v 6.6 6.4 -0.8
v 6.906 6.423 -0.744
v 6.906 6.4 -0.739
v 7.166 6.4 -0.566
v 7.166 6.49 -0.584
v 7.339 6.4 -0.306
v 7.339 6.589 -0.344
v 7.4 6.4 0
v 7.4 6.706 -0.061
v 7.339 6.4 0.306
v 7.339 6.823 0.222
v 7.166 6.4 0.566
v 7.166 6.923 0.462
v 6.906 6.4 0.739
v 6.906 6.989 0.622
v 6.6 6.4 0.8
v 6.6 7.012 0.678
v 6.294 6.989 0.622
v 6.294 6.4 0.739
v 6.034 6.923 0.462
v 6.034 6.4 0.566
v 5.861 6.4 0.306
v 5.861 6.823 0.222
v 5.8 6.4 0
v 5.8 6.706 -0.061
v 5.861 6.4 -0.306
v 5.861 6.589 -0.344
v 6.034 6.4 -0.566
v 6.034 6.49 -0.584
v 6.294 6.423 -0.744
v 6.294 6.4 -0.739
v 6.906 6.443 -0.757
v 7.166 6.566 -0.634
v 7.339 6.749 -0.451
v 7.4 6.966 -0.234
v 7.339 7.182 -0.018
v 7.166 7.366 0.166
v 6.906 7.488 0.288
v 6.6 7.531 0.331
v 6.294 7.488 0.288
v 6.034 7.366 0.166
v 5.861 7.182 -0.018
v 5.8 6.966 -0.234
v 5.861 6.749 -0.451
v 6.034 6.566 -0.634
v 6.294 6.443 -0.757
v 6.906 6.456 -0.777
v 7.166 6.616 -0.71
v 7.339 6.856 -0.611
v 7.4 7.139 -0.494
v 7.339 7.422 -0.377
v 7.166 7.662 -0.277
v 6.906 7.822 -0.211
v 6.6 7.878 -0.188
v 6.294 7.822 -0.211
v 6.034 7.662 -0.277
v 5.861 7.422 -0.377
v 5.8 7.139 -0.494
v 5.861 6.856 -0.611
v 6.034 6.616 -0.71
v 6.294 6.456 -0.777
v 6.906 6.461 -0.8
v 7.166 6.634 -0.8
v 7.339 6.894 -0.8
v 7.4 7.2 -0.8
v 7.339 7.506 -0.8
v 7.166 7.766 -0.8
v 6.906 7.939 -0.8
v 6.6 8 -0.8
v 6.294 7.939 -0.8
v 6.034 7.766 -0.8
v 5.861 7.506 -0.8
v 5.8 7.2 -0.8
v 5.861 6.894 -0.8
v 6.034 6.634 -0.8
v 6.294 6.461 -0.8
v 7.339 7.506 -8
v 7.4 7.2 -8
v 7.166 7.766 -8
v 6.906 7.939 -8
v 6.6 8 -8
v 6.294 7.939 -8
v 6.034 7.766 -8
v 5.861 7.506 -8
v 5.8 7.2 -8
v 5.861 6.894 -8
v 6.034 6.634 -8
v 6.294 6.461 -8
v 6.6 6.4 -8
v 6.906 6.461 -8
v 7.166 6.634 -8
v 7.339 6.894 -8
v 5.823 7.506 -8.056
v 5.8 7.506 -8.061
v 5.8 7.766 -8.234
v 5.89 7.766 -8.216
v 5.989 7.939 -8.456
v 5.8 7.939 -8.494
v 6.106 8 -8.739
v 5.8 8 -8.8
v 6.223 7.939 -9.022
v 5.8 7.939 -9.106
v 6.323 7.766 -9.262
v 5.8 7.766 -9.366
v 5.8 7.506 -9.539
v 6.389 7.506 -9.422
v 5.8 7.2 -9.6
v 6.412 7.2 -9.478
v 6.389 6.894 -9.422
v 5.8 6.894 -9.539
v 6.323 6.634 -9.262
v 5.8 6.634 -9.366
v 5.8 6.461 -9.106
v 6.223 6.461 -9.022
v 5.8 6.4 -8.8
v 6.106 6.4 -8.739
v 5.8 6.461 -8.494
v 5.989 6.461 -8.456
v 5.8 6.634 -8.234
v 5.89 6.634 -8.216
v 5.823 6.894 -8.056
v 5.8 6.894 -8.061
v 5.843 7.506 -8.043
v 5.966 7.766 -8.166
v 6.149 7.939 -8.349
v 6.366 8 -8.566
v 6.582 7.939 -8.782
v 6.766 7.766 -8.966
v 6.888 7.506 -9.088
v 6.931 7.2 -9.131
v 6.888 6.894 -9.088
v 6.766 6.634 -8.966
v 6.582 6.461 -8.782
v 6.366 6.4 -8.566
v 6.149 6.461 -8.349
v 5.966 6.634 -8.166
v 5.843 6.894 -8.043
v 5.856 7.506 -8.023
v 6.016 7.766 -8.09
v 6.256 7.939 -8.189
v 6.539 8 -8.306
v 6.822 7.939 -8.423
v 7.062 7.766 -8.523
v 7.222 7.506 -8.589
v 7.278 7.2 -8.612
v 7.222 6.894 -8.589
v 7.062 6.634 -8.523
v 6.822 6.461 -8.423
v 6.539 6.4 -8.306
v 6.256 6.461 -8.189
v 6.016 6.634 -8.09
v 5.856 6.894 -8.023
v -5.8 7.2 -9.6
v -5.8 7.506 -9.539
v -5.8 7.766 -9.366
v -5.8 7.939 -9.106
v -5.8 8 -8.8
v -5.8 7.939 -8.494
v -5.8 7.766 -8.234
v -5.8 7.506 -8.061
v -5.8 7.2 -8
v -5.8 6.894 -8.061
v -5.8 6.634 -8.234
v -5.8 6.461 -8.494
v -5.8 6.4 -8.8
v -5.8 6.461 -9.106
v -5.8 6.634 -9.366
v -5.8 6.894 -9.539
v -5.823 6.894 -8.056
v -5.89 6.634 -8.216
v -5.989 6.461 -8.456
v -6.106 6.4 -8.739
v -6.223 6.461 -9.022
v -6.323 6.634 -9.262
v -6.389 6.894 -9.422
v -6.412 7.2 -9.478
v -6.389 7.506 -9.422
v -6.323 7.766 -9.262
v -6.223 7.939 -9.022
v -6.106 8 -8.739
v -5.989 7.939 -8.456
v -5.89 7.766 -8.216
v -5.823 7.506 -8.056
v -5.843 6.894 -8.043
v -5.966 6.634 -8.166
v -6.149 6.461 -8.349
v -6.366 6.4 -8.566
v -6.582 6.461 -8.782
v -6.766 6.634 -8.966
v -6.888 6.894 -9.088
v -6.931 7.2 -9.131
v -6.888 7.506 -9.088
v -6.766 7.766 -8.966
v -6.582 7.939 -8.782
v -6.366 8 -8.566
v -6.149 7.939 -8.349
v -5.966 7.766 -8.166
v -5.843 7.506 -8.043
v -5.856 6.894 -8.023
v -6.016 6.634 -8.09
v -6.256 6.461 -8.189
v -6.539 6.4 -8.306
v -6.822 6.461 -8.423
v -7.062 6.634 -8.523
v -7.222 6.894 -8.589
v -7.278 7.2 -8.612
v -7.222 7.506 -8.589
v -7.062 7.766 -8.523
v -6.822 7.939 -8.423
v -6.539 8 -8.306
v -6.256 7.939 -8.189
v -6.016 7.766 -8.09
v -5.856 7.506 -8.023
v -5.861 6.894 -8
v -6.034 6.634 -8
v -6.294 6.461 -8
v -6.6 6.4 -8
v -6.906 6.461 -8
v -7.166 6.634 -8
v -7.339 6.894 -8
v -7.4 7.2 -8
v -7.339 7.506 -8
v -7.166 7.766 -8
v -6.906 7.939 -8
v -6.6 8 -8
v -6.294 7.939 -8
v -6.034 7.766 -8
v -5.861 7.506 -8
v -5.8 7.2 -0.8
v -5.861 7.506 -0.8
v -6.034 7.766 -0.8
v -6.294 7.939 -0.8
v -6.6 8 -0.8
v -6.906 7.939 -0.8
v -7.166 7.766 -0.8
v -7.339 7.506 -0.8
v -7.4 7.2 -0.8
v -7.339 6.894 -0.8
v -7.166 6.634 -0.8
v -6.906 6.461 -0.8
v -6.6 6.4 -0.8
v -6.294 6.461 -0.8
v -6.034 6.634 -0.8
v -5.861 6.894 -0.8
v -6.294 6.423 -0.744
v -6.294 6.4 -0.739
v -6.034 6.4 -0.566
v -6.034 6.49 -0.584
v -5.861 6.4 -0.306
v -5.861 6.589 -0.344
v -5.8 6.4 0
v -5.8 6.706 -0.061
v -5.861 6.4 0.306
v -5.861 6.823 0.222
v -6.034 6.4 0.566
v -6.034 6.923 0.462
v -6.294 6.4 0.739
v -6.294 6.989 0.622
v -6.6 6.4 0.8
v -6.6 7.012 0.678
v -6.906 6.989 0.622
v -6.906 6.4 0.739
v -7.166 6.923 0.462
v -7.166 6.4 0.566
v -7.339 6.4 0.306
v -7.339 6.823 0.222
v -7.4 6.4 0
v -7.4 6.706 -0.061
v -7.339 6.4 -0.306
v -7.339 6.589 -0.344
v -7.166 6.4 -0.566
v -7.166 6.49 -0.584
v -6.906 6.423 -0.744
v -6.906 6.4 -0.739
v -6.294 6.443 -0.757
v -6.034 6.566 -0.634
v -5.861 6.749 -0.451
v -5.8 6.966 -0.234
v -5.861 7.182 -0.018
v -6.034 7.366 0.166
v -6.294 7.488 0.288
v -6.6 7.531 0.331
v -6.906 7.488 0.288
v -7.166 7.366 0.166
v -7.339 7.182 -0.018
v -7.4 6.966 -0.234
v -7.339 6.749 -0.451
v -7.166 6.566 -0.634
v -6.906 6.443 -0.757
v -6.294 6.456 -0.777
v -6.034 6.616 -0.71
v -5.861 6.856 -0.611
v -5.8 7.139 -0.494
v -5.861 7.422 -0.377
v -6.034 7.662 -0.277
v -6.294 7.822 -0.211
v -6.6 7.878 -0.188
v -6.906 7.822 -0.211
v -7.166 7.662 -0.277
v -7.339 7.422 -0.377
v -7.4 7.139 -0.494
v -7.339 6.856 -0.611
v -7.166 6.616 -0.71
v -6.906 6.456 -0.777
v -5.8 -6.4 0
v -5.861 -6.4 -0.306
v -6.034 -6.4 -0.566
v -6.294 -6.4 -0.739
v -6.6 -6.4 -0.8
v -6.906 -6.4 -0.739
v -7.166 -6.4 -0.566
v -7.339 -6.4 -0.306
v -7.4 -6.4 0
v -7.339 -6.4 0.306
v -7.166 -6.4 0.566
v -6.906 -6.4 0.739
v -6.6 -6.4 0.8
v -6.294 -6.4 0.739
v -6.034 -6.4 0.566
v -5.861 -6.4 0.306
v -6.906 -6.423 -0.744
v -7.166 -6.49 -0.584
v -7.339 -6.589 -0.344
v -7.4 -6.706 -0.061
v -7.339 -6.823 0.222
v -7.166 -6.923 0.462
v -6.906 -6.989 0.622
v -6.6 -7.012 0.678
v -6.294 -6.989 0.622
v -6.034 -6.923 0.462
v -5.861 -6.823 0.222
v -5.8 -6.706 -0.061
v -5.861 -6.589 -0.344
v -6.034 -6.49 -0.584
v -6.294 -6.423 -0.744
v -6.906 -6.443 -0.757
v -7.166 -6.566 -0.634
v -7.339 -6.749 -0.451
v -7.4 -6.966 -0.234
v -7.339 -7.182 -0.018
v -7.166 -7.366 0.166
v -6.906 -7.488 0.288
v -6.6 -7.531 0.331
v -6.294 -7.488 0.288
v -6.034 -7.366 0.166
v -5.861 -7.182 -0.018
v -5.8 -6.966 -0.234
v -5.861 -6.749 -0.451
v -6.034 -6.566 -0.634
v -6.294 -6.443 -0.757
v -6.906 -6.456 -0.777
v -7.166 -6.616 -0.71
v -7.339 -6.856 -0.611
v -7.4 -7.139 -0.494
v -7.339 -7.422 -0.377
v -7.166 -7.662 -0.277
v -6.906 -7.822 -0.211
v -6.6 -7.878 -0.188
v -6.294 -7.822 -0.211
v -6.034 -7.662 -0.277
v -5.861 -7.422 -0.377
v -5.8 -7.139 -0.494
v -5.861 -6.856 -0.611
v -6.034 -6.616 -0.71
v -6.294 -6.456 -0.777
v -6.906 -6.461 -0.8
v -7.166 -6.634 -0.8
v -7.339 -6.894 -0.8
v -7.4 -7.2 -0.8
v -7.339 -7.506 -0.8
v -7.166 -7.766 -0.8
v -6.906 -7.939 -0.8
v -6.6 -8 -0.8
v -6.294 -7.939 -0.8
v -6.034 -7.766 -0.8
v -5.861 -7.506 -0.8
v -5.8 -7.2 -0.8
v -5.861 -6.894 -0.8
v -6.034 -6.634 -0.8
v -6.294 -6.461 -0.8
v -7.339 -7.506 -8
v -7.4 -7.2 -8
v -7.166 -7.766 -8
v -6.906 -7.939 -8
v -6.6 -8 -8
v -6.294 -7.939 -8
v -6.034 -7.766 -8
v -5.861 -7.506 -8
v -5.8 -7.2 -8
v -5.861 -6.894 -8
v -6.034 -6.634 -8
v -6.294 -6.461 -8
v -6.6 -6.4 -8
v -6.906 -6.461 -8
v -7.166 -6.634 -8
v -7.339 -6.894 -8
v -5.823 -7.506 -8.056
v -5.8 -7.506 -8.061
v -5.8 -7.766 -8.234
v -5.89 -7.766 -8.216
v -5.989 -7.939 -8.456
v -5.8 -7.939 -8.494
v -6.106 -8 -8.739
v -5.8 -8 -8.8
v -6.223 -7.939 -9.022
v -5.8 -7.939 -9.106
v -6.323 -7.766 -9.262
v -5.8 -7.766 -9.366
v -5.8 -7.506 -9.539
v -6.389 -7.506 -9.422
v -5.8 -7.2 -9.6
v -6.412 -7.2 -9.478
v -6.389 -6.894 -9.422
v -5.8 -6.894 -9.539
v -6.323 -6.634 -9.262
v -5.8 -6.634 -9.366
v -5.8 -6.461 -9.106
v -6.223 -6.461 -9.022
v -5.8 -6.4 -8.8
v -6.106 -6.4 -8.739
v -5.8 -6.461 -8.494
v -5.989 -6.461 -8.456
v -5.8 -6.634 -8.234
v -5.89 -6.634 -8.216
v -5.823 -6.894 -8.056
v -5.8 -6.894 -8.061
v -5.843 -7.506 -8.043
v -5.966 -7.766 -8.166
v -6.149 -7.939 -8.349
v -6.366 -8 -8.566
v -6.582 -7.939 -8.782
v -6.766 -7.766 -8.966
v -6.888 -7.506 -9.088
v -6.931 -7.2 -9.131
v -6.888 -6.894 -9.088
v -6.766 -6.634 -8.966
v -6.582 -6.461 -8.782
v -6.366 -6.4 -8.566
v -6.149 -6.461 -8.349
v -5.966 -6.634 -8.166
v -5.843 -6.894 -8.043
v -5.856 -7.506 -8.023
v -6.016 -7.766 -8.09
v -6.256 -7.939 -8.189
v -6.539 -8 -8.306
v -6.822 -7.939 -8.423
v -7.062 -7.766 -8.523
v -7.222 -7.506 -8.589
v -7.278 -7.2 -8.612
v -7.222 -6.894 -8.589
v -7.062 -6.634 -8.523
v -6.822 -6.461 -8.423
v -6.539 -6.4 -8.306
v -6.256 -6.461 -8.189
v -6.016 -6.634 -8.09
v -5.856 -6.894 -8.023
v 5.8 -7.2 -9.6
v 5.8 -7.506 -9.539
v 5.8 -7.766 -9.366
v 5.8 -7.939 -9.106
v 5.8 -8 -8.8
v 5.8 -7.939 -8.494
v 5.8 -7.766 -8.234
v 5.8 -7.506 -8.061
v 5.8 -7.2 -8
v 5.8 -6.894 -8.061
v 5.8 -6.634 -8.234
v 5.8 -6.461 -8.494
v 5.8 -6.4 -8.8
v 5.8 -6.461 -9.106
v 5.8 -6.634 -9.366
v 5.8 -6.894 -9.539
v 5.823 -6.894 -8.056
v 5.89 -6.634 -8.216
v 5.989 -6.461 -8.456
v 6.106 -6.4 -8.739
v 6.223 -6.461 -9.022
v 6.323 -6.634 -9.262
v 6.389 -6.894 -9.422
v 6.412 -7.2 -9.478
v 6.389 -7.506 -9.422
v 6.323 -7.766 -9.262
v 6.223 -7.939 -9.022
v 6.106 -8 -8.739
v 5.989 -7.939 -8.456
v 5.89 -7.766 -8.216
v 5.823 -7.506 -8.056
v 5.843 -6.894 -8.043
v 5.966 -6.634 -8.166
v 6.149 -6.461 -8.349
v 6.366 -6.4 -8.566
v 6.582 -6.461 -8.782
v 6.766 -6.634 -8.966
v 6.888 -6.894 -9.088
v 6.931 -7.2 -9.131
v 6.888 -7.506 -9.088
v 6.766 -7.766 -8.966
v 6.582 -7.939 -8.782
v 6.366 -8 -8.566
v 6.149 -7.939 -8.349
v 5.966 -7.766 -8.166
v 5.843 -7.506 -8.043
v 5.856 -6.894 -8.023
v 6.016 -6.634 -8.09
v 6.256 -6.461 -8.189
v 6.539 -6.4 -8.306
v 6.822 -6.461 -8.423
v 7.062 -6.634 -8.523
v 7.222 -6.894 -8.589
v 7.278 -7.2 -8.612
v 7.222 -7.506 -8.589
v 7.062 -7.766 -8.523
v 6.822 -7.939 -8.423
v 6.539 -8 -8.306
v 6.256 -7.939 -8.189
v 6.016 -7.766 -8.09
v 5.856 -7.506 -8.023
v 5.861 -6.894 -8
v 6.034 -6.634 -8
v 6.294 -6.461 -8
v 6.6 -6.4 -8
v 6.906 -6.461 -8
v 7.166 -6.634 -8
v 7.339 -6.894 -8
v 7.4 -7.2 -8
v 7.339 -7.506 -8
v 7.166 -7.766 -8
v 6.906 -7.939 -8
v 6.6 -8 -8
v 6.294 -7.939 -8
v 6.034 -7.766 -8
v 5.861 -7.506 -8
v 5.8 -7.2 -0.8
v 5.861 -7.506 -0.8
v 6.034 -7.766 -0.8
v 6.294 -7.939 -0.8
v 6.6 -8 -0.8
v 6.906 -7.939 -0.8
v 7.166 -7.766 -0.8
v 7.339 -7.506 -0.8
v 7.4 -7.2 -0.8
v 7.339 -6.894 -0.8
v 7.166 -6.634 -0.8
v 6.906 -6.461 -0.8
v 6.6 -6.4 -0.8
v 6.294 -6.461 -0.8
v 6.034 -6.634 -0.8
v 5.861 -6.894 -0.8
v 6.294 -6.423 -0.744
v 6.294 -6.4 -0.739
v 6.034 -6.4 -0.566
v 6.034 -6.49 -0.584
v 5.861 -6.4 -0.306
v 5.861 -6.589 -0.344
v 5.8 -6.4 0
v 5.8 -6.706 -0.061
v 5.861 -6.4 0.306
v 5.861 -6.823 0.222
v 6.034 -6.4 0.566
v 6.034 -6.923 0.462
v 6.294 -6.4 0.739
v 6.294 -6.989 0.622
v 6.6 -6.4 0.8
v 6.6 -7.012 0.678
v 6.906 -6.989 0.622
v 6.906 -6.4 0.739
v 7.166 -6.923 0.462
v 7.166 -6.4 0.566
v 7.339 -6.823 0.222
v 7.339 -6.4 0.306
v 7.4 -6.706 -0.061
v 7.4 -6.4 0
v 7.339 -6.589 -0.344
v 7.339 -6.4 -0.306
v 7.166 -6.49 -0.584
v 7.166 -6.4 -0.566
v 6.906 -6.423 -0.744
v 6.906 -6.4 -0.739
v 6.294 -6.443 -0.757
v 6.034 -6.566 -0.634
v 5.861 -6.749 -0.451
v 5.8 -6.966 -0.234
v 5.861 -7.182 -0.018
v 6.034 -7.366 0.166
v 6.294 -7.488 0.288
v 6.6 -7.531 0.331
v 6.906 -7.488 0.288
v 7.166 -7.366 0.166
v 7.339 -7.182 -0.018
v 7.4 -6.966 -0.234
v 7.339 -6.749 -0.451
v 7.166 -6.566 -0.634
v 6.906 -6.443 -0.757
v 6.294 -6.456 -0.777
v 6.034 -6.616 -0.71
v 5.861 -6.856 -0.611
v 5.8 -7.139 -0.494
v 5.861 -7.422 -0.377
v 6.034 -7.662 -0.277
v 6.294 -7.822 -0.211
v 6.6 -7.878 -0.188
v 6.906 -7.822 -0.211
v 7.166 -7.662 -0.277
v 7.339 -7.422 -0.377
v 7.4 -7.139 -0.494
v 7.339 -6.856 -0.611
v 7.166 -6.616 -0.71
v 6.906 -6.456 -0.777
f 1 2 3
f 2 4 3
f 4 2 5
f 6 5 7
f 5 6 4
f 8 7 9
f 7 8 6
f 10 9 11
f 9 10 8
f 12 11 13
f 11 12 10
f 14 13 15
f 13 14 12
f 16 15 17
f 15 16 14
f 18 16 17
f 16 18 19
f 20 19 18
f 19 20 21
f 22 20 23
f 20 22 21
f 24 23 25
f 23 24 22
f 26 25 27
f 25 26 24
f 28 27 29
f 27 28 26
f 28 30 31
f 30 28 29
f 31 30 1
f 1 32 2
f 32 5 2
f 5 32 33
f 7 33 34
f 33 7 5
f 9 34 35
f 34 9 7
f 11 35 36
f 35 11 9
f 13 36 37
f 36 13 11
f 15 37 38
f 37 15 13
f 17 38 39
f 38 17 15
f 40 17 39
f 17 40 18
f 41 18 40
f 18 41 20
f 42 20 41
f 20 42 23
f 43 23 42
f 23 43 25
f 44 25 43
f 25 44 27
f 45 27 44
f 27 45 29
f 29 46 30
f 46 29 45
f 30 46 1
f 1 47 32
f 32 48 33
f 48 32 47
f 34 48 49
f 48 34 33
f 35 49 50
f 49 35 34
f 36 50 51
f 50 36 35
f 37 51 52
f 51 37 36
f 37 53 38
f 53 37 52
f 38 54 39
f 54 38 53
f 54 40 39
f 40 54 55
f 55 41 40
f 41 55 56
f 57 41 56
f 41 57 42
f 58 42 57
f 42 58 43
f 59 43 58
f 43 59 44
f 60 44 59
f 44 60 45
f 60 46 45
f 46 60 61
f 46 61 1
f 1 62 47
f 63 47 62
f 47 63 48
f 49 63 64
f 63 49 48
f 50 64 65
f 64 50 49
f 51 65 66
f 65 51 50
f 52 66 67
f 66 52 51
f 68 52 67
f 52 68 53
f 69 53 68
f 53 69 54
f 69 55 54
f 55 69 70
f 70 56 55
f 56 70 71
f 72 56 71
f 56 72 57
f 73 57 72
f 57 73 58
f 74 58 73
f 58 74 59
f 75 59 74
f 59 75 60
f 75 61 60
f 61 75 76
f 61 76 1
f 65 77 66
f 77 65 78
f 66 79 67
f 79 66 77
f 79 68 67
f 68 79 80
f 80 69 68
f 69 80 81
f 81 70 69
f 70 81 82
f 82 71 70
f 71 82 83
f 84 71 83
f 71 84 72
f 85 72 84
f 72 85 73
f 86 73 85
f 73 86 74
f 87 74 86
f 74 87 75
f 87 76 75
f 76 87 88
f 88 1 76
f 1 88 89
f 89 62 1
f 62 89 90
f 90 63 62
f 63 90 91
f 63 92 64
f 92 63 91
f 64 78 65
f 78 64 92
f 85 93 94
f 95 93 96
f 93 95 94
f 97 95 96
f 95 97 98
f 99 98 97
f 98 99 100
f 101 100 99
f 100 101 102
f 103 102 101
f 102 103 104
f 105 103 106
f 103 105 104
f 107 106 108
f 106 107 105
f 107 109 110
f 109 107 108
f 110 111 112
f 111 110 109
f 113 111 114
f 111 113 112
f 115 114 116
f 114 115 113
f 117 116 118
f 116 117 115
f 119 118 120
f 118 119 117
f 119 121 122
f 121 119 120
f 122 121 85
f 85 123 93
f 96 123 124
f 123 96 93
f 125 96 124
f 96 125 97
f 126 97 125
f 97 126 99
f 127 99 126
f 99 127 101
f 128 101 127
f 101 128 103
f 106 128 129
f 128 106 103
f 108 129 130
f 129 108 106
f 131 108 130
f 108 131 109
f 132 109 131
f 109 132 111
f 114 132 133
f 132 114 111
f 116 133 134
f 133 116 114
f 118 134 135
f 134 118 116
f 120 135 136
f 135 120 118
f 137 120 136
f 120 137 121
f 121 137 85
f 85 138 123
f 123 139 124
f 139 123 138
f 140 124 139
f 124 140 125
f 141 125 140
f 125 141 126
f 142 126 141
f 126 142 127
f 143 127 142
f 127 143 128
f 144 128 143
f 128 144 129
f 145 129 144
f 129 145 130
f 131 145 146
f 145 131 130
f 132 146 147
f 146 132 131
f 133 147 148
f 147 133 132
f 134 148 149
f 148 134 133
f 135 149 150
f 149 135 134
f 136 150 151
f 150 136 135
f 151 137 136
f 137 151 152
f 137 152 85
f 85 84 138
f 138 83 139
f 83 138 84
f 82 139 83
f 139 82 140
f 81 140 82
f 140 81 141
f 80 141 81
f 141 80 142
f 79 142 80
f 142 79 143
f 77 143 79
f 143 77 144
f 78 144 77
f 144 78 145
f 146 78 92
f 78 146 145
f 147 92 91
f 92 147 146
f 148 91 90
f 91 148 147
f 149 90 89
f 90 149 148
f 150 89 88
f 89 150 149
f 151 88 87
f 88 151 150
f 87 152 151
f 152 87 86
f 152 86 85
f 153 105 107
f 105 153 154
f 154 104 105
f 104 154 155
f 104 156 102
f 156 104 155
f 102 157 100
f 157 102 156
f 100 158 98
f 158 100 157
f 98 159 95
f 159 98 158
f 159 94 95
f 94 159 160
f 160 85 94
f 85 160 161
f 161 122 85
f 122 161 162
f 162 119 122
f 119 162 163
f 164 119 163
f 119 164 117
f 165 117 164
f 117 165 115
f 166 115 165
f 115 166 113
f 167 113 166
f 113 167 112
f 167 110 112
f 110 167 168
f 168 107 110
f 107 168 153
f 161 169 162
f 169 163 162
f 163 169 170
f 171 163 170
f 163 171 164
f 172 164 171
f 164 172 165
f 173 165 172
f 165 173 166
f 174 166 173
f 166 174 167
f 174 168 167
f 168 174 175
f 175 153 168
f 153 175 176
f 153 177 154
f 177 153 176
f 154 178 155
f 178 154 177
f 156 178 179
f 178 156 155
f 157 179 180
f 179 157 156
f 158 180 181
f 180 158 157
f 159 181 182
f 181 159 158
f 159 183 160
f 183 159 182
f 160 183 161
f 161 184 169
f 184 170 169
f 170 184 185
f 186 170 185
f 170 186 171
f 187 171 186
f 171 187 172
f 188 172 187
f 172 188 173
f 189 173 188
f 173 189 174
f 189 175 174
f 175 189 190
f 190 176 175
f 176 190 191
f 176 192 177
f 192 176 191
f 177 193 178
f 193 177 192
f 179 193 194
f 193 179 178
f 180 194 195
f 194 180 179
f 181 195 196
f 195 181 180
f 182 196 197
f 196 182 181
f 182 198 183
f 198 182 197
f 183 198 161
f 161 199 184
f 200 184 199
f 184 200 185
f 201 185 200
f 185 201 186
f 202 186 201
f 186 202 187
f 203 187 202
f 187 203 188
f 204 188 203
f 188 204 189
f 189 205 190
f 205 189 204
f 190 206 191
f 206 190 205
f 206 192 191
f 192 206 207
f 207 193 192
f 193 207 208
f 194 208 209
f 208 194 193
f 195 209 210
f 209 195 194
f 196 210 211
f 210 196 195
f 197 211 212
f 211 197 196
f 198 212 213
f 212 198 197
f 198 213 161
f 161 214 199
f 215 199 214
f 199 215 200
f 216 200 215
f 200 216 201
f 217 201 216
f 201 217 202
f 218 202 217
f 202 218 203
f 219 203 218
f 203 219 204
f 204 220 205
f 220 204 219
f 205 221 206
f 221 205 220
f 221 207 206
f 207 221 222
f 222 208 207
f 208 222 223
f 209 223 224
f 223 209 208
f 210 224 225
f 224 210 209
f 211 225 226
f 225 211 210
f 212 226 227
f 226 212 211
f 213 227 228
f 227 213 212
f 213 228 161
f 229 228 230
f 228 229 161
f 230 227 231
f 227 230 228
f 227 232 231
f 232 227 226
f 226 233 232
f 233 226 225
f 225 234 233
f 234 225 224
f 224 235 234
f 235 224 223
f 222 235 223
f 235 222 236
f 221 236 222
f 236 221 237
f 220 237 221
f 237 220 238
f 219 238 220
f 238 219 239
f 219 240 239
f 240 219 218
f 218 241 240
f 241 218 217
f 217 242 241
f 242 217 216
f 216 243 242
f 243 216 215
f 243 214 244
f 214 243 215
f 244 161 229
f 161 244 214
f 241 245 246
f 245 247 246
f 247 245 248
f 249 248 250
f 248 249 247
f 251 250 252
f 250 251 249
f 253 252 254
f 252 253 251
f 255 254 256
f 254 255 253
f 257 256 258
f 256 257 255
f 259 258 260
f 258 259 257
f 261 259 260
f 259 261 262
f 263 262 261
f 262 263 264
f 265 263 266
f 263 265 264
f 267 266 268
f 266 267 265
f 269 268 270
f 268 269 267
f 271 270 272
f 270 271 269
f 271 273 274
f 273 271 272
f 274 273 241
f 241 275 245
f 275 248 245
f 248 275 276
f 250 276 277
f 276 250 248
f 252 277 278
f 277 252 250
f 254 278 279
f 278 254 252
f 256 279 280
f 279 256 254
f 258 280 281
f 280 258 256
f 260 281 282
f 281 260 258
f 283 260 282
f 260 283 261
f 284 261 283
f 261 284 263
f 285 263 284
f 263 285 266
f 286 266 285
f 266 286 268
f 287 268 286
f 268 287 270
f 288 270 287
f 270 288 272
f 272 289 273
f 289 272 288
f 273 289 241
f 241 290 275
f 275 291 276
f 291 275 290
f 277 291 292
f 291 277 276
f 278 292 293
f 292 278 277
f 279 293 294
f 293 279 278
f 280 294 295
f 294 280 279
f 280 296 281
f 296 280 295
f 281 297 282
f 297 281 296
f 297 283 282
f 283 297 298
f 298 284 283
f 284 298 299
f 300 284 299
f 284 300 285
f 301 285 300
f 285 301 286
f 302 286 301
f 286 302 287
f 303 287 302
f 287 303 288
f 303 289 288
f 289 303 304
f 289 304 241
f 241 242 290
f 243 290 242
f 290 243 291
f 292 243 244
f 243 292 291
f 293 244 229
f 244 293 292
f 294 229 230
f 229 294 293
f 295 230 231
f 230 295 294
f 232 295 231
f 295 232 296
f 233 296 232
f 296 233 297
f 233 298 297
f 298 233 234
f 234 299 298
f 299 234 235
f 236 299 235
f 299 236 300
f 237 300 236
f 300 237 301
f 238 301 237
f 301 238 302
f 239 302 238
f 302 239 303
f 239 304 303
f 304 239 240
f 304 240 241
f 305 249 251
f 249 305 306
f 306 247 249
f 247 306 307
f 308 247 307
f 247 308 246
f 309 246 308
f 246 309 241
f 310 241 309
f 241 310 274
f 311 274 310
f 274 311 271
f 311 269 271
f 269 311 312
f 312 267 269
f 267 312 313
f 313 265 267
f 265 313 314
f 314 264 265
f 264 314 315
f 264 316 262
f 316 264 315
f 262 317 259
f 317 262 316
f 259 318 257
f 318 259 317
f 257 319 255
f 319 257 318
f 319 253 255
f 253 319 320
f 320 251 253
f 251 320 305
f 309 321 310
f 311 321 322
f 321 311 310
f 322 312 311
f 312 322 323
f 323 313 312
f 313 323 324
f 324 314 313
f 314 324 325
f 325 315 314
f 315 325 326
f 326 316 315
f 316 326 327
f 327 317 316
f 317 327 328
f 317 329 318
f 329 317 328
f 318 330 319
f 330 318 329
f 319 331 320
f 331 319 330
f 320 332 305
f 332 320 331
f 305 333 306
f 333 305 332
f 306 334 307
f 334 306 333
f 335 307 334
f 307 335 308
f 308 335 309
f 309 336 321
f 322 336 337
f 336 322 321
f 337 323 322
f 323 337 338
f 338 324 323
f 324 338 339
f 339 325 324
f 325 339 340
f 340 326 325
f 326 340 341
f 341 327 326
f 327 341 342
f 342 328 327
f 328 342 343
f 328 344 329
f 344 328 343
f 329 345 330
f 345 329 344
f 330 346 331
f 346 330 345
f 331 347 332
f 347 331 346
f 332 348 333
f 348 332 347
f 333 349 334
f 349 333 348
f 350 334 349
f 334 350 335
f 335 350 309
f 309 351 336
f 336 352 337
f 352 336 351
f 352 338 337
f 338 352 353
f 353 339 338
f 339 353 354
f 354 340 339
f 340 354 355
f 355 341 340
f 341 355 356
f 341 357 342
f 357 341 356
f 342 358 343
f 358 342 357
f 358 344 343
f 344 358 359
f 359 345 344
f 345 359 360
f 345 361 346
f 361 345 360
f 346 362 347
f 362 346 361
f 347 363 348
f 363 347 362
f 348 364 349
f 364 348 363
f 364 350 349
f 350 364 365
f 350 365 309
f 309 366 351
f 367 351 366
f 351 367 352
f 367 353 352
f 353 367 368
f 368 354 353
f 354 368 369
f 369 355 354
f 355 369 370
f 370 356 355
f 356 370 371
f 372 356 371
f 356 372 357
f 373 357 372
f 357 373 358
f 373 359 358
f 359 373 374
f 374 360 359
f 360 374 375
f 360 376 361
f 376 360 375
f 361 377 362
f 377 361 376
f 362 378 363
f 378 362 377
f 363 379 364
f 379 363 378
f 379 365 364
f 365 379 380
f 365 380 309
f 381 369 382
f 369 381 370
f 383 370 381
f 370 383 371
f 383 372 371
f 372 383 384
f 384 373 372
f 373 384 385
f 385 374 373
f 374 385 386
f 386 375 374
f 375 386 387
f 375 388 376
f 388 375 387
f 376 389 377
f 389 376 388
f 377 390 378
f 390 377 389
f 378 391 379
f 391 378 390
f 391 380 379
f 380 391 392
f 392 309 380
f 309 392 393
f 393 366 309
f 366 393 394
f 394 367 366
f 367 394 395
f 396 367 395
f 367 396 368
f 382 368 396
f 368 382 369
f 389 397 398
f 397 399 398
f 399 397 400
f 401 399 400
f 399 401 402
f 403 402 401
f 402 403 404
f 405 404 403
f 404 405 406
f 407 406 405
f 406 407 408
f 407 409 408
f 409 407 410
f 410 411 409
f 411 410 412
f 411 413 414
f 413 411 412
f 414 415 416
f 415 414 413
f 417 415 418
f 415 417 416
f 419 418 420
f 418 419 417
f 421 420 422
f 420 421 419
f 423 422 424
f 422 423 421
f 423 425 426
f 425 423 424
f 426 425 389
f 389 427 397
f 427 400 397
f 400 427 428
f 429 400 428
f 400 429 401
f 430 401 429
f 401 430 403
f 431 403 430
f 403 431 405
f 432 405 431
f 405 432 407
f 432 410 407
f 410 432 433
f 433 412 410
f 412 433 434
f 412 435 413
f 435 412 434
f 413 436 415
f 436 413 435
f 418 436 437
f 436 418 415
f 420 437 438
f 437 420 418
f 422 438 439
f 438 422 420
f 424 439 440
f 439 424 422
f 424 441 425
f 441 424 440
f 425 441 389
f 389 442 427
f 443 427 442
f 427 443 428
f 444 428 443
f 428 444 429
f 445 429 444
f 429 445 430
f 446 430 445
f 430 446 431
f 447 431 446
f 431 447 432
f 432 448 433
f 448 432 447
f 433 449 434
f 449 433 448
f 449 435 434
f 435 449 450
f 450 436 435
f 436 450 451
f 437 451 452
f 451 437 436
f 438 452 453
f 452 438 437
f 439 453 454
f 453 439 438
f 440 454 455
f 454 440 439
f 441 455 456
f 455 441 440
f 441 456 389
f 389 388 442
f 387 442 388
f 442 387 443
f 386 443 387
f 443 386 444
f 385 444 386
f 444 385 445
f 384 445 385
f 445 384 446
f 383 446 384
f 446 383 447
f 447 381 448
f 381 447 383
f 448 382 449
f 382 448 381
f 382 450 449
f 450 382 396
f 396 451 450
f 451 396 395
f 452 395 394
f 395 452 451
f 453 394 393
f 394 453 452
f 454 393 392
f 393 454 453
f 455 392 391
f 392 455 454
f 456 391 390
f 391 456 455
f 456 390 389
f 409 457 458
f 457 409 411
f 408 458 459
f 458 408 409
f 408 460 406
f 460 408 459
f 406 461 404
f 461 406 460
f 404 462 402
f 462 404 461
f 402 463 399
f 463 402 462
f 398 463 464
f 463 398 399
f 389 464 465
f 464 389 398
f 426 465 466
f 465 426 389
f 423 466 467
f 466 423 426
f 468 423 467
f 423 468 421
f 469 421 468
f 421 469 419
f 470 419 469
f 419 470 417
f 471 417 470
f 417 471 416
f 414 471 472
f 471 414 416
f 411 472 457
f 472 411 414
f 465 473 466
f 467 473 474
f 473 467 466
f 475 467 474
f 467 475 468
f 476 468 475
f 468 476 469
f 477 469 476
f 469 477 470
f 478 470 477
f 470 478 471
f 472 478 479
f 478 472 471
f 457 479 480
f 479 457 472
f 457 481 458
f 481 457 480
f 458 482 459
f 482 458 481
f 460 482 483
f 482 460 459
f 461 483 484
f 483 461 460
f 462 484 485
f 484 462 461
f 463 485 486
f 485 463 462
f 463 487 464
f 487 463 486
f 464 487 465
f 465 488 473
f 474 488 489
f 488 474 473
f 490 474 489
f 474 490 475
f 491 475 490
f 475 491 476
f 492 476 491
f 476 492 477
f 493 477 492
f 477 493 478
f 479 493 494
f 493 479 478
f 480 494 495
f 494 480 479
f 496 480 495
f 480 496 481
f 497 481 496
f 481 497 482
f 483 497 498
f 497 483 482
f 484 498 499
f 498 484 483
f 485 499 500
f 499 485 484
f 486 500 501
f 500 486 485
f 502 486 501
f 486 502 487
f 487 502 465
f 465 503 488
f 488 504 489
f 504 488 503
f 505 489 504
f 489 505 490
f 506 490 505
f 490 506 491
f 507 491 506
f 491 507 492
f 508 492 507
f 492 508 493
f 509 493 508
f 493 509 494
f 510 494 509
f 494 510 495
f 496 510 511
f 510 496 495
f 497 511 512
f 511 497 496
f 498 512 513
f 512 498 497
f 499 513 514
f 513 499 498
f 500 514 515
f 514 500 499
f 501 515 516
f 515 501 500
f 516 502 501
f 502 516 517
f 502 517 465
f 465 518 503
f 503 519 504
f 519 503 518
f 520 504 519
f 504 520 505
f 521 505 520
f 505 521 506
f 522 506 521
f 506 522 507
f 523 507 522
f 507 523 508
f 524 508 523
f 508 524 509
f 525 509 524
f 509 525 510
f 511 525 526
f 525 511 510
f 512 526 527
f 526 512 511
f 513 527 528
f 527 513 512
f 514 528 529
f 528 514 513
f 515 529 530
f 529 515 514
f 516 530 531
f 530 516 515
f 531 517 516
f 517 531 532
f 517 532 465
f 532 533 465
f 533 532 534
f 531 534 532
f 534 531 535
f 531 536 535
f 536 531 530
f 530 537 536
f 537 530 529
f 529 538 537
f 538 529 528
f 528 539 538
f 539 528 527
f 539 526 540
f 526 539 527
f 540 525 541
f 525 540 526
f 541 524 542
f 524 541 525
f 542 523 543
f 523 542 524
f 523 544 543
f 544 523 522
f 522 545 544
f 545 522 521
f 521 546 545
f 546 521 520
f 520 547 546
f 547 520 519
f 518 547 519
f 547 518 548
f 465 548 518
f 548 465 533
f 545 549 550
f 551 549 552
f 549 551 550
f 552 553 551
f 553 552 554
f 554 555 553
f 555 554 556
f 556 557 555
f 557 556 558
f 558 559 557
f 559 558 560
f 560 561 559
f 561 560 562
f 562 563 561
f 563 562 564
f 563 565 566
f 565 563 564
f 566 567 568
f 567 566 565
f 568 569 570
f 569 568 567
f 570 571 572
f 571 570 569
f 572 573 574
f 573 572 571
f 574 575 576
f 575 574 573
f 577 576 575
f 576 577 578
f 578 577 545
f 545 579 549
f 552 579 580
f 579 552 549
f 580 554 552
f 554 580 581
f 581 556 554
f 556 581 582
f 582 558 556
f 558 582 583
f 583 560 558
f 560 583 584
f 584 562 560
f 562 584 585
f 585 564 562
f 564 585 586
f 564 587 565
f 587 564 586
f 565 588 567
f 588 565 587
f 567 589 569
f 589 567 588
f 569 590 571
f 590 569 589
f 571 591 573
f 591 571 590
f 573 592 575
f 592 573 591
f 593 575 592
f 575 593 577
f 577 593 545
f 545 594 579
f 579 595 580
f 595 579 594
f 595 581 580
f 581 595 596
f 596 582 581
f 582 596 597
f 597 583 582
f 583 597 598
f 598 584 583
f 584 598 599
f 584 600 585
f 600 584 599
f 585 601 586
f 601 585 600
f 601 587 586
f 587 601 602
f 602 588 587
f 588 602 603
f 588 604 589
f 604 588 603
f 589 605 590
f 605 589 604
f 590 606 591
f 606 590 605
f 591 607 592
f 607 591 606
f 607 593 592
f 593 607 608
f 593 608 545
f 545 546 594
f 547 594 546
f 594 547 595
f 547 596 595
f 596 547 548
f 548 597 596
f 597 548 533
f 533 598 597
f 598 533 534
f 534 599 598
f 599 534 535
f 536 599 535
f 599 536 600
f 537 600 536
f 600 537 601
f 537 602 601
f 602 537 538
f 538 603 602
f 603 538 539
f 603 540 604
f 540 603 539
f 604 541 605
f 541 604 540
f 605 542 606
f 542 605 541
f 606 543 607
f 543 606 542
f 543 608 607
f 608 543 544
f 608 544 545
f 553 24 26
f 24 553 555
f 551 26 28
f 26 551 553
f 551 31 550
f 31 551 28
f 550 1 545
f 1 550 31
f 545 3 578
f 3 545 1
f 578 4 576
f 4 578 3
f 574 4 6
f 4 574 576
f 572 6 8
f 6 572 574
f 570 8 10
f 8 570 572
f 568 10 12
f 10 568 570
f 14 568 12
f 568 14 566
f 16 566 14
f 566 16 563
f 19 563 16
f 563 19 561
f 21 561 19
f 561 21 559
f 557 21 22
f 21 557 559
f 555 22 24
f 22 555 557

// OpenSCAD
// file: ../p/4-4cyli.scad
use <../lib.scad>
function ldraw_lib__4_4cyli() = [
// 0 Cylinder 1.0
// 0 Name: 4-4cyli.dat
// 0 Author: James Jessiman
// 0 !LDRAW_ORG Primitive UPDATE 2005-01
// 0 !LICENSE Licensed under CC BY 4.0 : see CAreadme.txt
// 
// 0 BFC CERTIFY CCW
  [0,"BFC","CERTIFY"],
  [0,"BFC","CCW"],
// 
// 0 !HISTORY 1998-12-15 [PTadmin] Official Update 1998-10
// 0 !HISTORY 2002-03-23 [sbliss] Added BFC statement; merged headers from files in distributions LDraw 0.27 and Complete.
// 0 !HISTORY 2002-04-25 [PTadmin] Official Update 2002-02
// 0 !HISTORY 2004-12-14 [guyvivan] BFC CCW
// 0 !HISTORY 2005-12-28 [PTadmin] Official Update 2005-01
// 0 !HISTORY 2007-06-24 [PTadmin] Header formatted for Contributor Agreement
// 0 !HISTORY 2008-07-01 [PTadmin] Official Update 2008-01
// 
// 
// 4 16 1 1 0 0.9239 1 0.3827 0.9239 0 0.3827 1 0 0
  [4,16,1,1,0,0.9239,1,0.3827,0.9239,0,0.3827,1,0,0],
// 5 24 1 0 0 1 1 0 0.9239 0 0.3827 0.9239 0 -0.3827
  [5,24,1,0,0,1,1,0,0.9239,0,0.3827,0.9239,0,-0.3827],
// 4 16 0.9239 1 0.3827 0.7071 1 0.7071 0.7071 0 0.7071 0.9239 0 0.3827
  [4,16,0.9239,1,0.3827,0.7071,1,0.7071,0.7071,0,0.7071,0.9239,0,0.3827],
// 5 24 0.9239 0 0.3827 0.9239 1 0.3827 0.7071 0 0.7071 1 0 0
  [5,24,0.9239,0,0.3827,0.9239,1,0.3827,0.7071,0,0.7071,1,0,0],
// 4 16 0.7071 1 0.7071 0.3827 1 0.9239 0.3827 0 0.9239 0.7071 0 0.7071
  [4,16,0.7071,1,0.7071,0.3827,1,0.9239,0.3827,0,0.9239,0.7071,0,0.7071],
// 5 24 0.7071 0 0.7071 0.7071 1 0.7071 0.3827 0 0.9239 0.9239 0 0.3827
  [5,24,0.7071,0,0.7071,0.7071,1,0.7071,0.3827,0,0.9239,0.9239,0,0.3827],
// 4 16 0.3827 1 0.9239 0 1 1 0 0 1 0.3827 0 0.9239
  [4,16,0.3827,1,0.9239,0,1,1,0,0,1,0.3827,0,0.9239],
// 5 24 0.3827 0 0.9239 0.3827 1 0.9239 0 0 1 0.7071 0 0.7071
  [5,24,0.3827,0,0.9239,0.3827,1,0.9239,0,0,1,0.7071,0,0.7071],
// 4 16 0 1 1 -0.3827 1 0.9239 -0.3827 0 0.9239 0 0 1
  [4,16,0,1,1,-0.3827,1,0.9239,-0.3827,0,0.9239,0,0,1],
// 5 24 0 0 1 0 1 1 -0.3827 0 0.9239 0.3827 0 0.9239
  [5,24,0,0,1,0,1,1,-0.3827,0,0.9239,0.3827,0,0.9239],
// 4 16 -0.3827 1 0.9239 -0.7071 1 0.7071 -0.7071 0 0.7071 -0.3827 0 0.9239
  [4,16,-0.3827,1,0.9239,-0.7071,1,0.7071,-0.7071,0,0.7071,-0.3827,0,0.9239],
// 5 24 -0.3827 0 0.9239 -0.3827 1 0.9239 -0.7071 0 0.7071 0 0 1
  [5,24,-0.3827,0,0.9239,-0.3827,1,0.9239,-0.7071,0,0.7071,0,0,1],
// 4 16 -0.7071 1 0.7071 -0.9239 1 0.3827 -0.9239 0 0.3827 -0.7071 0 0.7071
  [4,16,-0.7071,1,0.7071,-0.9239,1,0.3827,-0.9239,0,0.3827,-0.7071,0,0.7071],
// 5 24 -0.7071 0 0.7071 -0.7071 1 0.7071 -0.9239 0 0.3827 -0.3827 0 0.9239
  [5,24,-0.7071,0,0.7071,-0.7071,1,0.7071,-0.9239,0,0.3827,-0.3827,0,0.9239],
// 4 16 -0.9239 1 0.3827 -1 1 0 -1 0 0 -0.9239 0 0.3827
  [4,16,-0.9239,1,0.3827,-1,1,0,-1,0,0,-0.9239,0,0.3827],
// 5 24 -0.9239 0 0.3827 -0.9239 1 0.3827 -1 0 0 -0.7071 0 0.7071
  [5,24,-0.9239,0,0.3827,-0.9239,1,0.3827,-1,0,0,-0.7071,0,0.7071],
// 4 16 -1 1 0 -0.9239 1 -0.3827 -0.9239 0 -0.3827 -1 0 0
  [4,16,-1,1,0,-0.9239,1,-0.3827,-0.9239,0,-0.3827,-1,0,0],
// 5 24 -1 0 0 -1 1 0 -0.9239 0 -0.3827 -0.9239 0 0.3827
  [5,24,-1,0,0,-1,1,0,-0.9239,0,-0.3827,-0.9239,0,0.3827],
// 4 16 -0.9239 1 -0.3827 -0.7071 1 -0.7071 -0.7071 0 -0.7071 -0.9239 0 -0.3827
  [4,16,-0.9239,1,-0.3827,-0.7071,1,-0.7071,-0.7071,0,-0.7071,-0.9239,0,-0.3827],
// 5 24 -0.9239 0 -0.3827 -0.9239 1 -0.3827 -0.7071 0 -0.7071 -1 0 0
  [5,24,-0.9239,0,-0.3827,-0.9239,1,-0.3827,-0.7071,0,-0.7071,-1,0,0],
// 4 16 -0.7071 1 -0.7071 -0.3827 1 -0.9239 -0.3827 0 -0.9239 -0.7071 0 -0.7071
  [4,16,-0.7071,1,-0.7071,-0.3827,1,-0.9239,-0.3827,0,-0.9239,-0.7071,0,-0.7071],
// 5 24 -0.7071 0 -0.7071 -0.7071 1 -0.7071 -0.3827 0 -0.9239 -0.9239 0 -0.3827
  [5,24,-0.7071,0,-0.7071,-0.7071,1,-0.7071,-0.3827,0,-0.9239,-0.9239,0,-0.3827],
// 4 16 -0.3827 1 -0.9239 0 1 -1 0 0 -1 -0.3827 0 -0.9239
  [4,16,-0.3827,1,-0.9239,0,1,-1,0,0,-1,-0.3827,0,-0.9239],
// 5 24 -0.3827 0 -0.9239 -0.3827 1 -0.9239 0 0 -1 -0.7071 0 -0.7071
  [5,24,-0.3827,0,-0.9239,-0.3827,1,-0.9239,0,0,-1,-0.7071,0,-0.7071],
// 4 16 0 1 -1 0.3827 1 -0.9239 0.3827 0 -0.9239 0 0 -1
  [4,16,0,1,-1,0.3827,1,-0.9239,0.3827,0,-0.9239,0,0,-1],
// 5 24 0 0 -1 0 1 -1 0.3827 0 -0.9239 -0.3827 0 -0.9239
  [5,24,0,0,-1,0,1,-1,0.3827,0,-0.9239,-0.3827,0,-0.9239],
// 4 16 0.3827 1 -0.9239 0.7071 1 -0.7071 0.7071 0 -0.7071 0.3827 0 -0.9239
  [4,16,0.3827,1,-0.9239,0.7071,1,-0.7071,0.7071,0,-0.7071,0.3827,0,-0.9239],
// 5 24 0.3827 0 -0.9239 0.3827 1 -0.9239 0.7071 0 -0.7071 0 0 -1
  [5,24,0.3827,0,-0.9239,0.3827,1,-0.9239,0.7071,0,-0.7071,0,0,-1],
// 4 16 0.7071 1 -0.7071 0.9239 1 -0.3827 0.9239 0 -0.3827 0.7071 0 -0.7071
  [4,16,0.7071,1,-0.7071,0.9239,1,-0.3827,0.9239,0,-0.3827,0.7071,0,-0.7071],
// 5 24 0.7071 0 -0.7071 0.7071 1 -0.7071 0.9239 0 -0.3827 0.3827 0 -0.9239
  [5,24,0.7071,0,-0.7071,0.7071,1,-0.7071,0.9239,0,-0.3827,0.3827,0,-0.9239],
// 4 16 0.9239 1 -0.3827 1 1 0 1 0 0 0.9239 0 -0.3827
  [4,16,0.9239,1,-0.3827,1,1,0,1,0,0,0.9239,0,-0.3827],
// 5 24 0.9239 0 -0.3827 0.9239 1 -0.3827 1 0 0 0.7071 0 -0.7071
  [5,24,0.9239,0,-0.3827,0.9239,1,-0.3827,1,0,0,0.7071,0,-0.7071],
// 0
];
module ldraw_lib__4_4cyli(step=0, col=false, unit=2/5, alt=false, line=0.2, solid=!$preview)
    makepoly(ldraw_lib__4_4cyli(), step=step, col=col, unit=unit, alt=alt, line=line, solid=solid);
ldraw_lib__4_4cyli(line=0.2);
// main file
use <../lib.scad>
use <../p/4-4cyli.scad>
use <../p/r04q1000.scad>
function ldraw_lib__85543_f2() = [
// 0 Rubber Belt Round 15 /  1.6 (Formed for 2 Plates  2 x  2 with Hinge - Loaded)
// 0 Name: 85543-f2.dat
// 0 Author: Magnus Forsberg [MagFors]
// 0 !LDRAW_ORG Part UPDATE 2019-03
// 0 !LICENSE Licensed under CC BY 4.0 : see CAreadme.txt
// 
// 0 !HELP 1 4 0 6 -40 1 0 0 0 1 0 0 0 1 15108.dat
// 0 !HELP 1 4 0 6 40 -1 0 0 0 1 0 0 0 -1 15108.dat
// 0 !HELP 1 71 10 0 0 1 0 0 0 1 0 0 0 1 4274.dat
// 0 !HELP 1 15 0 0 0 1 0 0 0 1 0 0 0 1 85543c02.dat
// 
// 0 BFC CERTIFY CCW
  [0,"BFC","CERTIFY"],
  [0,"BFC","CCW"],
// 
// 0 !CATEGORY Technic
// 0 !KEYWORDS BrickLink x71, Rebrickable 85543
// 
// 0 !HISTORY 2019-12-27 [PTadmin] Official Update 2019-03
// 
// 
// 1 16 16.5 2 16 0 2 0 -2 0 0 0 0 2 r04q1000.dat
  [1,16,16.5,2,16,0,2,0,-2,0,0,0,0,2, ldraw_lib__r04q1000()],
// 1 16 16.5 2 18 2 0 0 0 18 0 0 0 2 4-4cyli.dat
  [1,16,16.5,2,18,2,0,0,0,18,0,0,0,2, ldraw_lib__4_4cyli()],
// 1 16 14.5 20 18 0 0 2 2 0 0 0 2 0 r04q1000.dat
  [1,16,14.5,20,18,0,0,2,2,0,0,0,2,0, ldraw_lib__r04q1000()],
// 1 16 14.5 22 18 0 -29 0 2 0 0 0 0 2 4-4cyli.dat
  [1,16,14.5,22,18,0,-29,0,2,0,0,0,0,2, ldraw_lib__4_4cyli()],
// 1 16 -14.5 20 18 0 0 -2 2 0 0 0 -2 0 r04q1000.dat
  [1,16,-14.5,20,18,0,0,-2,2,0,0,0,-2,0, ldraw_lib__r04q1000()],
// 1 16 -16.5 2 18 2 0 0 0 18 0 0 0 2 4-4cyli.dat
  [1,16,-16.5,2,18,2,0,0,0,18,0,0,0,2, ldraw_lib__4_4cyli()],
// 1 16 -16.5 2 16 0 2 0 -2 0 0 0 0 2 r04q1000.dat
  [1,16,-16.5,2,16,0,2,0,-2,0,0,0,0,2, ldraw_lib__r04q1000()],
// 1 16 -16.5 0 16 2 0 0 0 0 2 0 -32 0 4-4cyli.dat
  [1,16,-16.5,0,16,2,0,0,0,0,2,0,-32,0, ldraw_lib__4_4cyli()],
// 1 16 -16.5 2 -16 0 -2 0 -2 0 0 0 0 -2 r04q1000.dat
  [1,16,-16.5,2,-16,0,-2,0,-2,0,0,0,0,-2, ldraw_lib__r04q1000()],
// 1 16 -16.5 2 -18 -2 0 0 0 18 0 0 0 -2 4-4cyli.dat
  [1,16,-16.5,2,-18,-2,0,0,0,18,0,0,0,-2, ldraw_lib__4_4cyli()],
// 1 16 -14.5 20 -18 0 0 -2 2 0 0 0 -2 0 r04q1000.dat
  [1,16,-14.5,20,-18,0,0,-2,2,0,0,0,-2,0, ldraw_lib__r04q1000()],
// 1 16 -14.5 22 -18 0 29 0 2 0 0 0 0 -2 4-4cyli.dat
  [1,16,-14.5,22,-18,0,29,0,2,0,0,0,0,-2, ldraw_lib__4_4cyli()],
// 1 16 14.5 20 -18 0 0 2 2 0 0 0 2 0 r04q1000.dat
  [1,16,14.5,20,-18,0,0,2,2,0,0,0,2,0, ldraw_lib__r04q1000()],
// 1 16 16.5 2 -18 -2 0 0 0 18 0 0 0 -2 4-4cyli.dat
  [1,16,16.5,2,-18,-2,0,0,0,18,0,0,0,-2, ldraw_lib__4_4cyli()],
// 1 16 16.5 2 -16 0 -2 0 -2 0 0 0 0 -2 r04q1000.dat
  [1,16,16.5,2,-16,0,-2,0,-2,0,0,0,0,-2, ldraw_lib__r04q1000()],
// 1 16 16.5 0 -16 -2 0 0 0 0 2 0 32 0 4-4cyli.dat
  [1,16,16.5,0,-16,-2,0,0,0,0,2,0,32,0, ldraw_lib__4_4cyli()],
];
module ldraw_lib__85543_f2(step=0, col=false, unit=2/5, alt=false, line=0.2, solid=!$preview)
    makepoly(ldraw_lib__85543_f2(), step=step, col=col, unit=unit, alt=alt, line=line, solid=solid);
ldraw_lib__85543_f2(line=0.2);
